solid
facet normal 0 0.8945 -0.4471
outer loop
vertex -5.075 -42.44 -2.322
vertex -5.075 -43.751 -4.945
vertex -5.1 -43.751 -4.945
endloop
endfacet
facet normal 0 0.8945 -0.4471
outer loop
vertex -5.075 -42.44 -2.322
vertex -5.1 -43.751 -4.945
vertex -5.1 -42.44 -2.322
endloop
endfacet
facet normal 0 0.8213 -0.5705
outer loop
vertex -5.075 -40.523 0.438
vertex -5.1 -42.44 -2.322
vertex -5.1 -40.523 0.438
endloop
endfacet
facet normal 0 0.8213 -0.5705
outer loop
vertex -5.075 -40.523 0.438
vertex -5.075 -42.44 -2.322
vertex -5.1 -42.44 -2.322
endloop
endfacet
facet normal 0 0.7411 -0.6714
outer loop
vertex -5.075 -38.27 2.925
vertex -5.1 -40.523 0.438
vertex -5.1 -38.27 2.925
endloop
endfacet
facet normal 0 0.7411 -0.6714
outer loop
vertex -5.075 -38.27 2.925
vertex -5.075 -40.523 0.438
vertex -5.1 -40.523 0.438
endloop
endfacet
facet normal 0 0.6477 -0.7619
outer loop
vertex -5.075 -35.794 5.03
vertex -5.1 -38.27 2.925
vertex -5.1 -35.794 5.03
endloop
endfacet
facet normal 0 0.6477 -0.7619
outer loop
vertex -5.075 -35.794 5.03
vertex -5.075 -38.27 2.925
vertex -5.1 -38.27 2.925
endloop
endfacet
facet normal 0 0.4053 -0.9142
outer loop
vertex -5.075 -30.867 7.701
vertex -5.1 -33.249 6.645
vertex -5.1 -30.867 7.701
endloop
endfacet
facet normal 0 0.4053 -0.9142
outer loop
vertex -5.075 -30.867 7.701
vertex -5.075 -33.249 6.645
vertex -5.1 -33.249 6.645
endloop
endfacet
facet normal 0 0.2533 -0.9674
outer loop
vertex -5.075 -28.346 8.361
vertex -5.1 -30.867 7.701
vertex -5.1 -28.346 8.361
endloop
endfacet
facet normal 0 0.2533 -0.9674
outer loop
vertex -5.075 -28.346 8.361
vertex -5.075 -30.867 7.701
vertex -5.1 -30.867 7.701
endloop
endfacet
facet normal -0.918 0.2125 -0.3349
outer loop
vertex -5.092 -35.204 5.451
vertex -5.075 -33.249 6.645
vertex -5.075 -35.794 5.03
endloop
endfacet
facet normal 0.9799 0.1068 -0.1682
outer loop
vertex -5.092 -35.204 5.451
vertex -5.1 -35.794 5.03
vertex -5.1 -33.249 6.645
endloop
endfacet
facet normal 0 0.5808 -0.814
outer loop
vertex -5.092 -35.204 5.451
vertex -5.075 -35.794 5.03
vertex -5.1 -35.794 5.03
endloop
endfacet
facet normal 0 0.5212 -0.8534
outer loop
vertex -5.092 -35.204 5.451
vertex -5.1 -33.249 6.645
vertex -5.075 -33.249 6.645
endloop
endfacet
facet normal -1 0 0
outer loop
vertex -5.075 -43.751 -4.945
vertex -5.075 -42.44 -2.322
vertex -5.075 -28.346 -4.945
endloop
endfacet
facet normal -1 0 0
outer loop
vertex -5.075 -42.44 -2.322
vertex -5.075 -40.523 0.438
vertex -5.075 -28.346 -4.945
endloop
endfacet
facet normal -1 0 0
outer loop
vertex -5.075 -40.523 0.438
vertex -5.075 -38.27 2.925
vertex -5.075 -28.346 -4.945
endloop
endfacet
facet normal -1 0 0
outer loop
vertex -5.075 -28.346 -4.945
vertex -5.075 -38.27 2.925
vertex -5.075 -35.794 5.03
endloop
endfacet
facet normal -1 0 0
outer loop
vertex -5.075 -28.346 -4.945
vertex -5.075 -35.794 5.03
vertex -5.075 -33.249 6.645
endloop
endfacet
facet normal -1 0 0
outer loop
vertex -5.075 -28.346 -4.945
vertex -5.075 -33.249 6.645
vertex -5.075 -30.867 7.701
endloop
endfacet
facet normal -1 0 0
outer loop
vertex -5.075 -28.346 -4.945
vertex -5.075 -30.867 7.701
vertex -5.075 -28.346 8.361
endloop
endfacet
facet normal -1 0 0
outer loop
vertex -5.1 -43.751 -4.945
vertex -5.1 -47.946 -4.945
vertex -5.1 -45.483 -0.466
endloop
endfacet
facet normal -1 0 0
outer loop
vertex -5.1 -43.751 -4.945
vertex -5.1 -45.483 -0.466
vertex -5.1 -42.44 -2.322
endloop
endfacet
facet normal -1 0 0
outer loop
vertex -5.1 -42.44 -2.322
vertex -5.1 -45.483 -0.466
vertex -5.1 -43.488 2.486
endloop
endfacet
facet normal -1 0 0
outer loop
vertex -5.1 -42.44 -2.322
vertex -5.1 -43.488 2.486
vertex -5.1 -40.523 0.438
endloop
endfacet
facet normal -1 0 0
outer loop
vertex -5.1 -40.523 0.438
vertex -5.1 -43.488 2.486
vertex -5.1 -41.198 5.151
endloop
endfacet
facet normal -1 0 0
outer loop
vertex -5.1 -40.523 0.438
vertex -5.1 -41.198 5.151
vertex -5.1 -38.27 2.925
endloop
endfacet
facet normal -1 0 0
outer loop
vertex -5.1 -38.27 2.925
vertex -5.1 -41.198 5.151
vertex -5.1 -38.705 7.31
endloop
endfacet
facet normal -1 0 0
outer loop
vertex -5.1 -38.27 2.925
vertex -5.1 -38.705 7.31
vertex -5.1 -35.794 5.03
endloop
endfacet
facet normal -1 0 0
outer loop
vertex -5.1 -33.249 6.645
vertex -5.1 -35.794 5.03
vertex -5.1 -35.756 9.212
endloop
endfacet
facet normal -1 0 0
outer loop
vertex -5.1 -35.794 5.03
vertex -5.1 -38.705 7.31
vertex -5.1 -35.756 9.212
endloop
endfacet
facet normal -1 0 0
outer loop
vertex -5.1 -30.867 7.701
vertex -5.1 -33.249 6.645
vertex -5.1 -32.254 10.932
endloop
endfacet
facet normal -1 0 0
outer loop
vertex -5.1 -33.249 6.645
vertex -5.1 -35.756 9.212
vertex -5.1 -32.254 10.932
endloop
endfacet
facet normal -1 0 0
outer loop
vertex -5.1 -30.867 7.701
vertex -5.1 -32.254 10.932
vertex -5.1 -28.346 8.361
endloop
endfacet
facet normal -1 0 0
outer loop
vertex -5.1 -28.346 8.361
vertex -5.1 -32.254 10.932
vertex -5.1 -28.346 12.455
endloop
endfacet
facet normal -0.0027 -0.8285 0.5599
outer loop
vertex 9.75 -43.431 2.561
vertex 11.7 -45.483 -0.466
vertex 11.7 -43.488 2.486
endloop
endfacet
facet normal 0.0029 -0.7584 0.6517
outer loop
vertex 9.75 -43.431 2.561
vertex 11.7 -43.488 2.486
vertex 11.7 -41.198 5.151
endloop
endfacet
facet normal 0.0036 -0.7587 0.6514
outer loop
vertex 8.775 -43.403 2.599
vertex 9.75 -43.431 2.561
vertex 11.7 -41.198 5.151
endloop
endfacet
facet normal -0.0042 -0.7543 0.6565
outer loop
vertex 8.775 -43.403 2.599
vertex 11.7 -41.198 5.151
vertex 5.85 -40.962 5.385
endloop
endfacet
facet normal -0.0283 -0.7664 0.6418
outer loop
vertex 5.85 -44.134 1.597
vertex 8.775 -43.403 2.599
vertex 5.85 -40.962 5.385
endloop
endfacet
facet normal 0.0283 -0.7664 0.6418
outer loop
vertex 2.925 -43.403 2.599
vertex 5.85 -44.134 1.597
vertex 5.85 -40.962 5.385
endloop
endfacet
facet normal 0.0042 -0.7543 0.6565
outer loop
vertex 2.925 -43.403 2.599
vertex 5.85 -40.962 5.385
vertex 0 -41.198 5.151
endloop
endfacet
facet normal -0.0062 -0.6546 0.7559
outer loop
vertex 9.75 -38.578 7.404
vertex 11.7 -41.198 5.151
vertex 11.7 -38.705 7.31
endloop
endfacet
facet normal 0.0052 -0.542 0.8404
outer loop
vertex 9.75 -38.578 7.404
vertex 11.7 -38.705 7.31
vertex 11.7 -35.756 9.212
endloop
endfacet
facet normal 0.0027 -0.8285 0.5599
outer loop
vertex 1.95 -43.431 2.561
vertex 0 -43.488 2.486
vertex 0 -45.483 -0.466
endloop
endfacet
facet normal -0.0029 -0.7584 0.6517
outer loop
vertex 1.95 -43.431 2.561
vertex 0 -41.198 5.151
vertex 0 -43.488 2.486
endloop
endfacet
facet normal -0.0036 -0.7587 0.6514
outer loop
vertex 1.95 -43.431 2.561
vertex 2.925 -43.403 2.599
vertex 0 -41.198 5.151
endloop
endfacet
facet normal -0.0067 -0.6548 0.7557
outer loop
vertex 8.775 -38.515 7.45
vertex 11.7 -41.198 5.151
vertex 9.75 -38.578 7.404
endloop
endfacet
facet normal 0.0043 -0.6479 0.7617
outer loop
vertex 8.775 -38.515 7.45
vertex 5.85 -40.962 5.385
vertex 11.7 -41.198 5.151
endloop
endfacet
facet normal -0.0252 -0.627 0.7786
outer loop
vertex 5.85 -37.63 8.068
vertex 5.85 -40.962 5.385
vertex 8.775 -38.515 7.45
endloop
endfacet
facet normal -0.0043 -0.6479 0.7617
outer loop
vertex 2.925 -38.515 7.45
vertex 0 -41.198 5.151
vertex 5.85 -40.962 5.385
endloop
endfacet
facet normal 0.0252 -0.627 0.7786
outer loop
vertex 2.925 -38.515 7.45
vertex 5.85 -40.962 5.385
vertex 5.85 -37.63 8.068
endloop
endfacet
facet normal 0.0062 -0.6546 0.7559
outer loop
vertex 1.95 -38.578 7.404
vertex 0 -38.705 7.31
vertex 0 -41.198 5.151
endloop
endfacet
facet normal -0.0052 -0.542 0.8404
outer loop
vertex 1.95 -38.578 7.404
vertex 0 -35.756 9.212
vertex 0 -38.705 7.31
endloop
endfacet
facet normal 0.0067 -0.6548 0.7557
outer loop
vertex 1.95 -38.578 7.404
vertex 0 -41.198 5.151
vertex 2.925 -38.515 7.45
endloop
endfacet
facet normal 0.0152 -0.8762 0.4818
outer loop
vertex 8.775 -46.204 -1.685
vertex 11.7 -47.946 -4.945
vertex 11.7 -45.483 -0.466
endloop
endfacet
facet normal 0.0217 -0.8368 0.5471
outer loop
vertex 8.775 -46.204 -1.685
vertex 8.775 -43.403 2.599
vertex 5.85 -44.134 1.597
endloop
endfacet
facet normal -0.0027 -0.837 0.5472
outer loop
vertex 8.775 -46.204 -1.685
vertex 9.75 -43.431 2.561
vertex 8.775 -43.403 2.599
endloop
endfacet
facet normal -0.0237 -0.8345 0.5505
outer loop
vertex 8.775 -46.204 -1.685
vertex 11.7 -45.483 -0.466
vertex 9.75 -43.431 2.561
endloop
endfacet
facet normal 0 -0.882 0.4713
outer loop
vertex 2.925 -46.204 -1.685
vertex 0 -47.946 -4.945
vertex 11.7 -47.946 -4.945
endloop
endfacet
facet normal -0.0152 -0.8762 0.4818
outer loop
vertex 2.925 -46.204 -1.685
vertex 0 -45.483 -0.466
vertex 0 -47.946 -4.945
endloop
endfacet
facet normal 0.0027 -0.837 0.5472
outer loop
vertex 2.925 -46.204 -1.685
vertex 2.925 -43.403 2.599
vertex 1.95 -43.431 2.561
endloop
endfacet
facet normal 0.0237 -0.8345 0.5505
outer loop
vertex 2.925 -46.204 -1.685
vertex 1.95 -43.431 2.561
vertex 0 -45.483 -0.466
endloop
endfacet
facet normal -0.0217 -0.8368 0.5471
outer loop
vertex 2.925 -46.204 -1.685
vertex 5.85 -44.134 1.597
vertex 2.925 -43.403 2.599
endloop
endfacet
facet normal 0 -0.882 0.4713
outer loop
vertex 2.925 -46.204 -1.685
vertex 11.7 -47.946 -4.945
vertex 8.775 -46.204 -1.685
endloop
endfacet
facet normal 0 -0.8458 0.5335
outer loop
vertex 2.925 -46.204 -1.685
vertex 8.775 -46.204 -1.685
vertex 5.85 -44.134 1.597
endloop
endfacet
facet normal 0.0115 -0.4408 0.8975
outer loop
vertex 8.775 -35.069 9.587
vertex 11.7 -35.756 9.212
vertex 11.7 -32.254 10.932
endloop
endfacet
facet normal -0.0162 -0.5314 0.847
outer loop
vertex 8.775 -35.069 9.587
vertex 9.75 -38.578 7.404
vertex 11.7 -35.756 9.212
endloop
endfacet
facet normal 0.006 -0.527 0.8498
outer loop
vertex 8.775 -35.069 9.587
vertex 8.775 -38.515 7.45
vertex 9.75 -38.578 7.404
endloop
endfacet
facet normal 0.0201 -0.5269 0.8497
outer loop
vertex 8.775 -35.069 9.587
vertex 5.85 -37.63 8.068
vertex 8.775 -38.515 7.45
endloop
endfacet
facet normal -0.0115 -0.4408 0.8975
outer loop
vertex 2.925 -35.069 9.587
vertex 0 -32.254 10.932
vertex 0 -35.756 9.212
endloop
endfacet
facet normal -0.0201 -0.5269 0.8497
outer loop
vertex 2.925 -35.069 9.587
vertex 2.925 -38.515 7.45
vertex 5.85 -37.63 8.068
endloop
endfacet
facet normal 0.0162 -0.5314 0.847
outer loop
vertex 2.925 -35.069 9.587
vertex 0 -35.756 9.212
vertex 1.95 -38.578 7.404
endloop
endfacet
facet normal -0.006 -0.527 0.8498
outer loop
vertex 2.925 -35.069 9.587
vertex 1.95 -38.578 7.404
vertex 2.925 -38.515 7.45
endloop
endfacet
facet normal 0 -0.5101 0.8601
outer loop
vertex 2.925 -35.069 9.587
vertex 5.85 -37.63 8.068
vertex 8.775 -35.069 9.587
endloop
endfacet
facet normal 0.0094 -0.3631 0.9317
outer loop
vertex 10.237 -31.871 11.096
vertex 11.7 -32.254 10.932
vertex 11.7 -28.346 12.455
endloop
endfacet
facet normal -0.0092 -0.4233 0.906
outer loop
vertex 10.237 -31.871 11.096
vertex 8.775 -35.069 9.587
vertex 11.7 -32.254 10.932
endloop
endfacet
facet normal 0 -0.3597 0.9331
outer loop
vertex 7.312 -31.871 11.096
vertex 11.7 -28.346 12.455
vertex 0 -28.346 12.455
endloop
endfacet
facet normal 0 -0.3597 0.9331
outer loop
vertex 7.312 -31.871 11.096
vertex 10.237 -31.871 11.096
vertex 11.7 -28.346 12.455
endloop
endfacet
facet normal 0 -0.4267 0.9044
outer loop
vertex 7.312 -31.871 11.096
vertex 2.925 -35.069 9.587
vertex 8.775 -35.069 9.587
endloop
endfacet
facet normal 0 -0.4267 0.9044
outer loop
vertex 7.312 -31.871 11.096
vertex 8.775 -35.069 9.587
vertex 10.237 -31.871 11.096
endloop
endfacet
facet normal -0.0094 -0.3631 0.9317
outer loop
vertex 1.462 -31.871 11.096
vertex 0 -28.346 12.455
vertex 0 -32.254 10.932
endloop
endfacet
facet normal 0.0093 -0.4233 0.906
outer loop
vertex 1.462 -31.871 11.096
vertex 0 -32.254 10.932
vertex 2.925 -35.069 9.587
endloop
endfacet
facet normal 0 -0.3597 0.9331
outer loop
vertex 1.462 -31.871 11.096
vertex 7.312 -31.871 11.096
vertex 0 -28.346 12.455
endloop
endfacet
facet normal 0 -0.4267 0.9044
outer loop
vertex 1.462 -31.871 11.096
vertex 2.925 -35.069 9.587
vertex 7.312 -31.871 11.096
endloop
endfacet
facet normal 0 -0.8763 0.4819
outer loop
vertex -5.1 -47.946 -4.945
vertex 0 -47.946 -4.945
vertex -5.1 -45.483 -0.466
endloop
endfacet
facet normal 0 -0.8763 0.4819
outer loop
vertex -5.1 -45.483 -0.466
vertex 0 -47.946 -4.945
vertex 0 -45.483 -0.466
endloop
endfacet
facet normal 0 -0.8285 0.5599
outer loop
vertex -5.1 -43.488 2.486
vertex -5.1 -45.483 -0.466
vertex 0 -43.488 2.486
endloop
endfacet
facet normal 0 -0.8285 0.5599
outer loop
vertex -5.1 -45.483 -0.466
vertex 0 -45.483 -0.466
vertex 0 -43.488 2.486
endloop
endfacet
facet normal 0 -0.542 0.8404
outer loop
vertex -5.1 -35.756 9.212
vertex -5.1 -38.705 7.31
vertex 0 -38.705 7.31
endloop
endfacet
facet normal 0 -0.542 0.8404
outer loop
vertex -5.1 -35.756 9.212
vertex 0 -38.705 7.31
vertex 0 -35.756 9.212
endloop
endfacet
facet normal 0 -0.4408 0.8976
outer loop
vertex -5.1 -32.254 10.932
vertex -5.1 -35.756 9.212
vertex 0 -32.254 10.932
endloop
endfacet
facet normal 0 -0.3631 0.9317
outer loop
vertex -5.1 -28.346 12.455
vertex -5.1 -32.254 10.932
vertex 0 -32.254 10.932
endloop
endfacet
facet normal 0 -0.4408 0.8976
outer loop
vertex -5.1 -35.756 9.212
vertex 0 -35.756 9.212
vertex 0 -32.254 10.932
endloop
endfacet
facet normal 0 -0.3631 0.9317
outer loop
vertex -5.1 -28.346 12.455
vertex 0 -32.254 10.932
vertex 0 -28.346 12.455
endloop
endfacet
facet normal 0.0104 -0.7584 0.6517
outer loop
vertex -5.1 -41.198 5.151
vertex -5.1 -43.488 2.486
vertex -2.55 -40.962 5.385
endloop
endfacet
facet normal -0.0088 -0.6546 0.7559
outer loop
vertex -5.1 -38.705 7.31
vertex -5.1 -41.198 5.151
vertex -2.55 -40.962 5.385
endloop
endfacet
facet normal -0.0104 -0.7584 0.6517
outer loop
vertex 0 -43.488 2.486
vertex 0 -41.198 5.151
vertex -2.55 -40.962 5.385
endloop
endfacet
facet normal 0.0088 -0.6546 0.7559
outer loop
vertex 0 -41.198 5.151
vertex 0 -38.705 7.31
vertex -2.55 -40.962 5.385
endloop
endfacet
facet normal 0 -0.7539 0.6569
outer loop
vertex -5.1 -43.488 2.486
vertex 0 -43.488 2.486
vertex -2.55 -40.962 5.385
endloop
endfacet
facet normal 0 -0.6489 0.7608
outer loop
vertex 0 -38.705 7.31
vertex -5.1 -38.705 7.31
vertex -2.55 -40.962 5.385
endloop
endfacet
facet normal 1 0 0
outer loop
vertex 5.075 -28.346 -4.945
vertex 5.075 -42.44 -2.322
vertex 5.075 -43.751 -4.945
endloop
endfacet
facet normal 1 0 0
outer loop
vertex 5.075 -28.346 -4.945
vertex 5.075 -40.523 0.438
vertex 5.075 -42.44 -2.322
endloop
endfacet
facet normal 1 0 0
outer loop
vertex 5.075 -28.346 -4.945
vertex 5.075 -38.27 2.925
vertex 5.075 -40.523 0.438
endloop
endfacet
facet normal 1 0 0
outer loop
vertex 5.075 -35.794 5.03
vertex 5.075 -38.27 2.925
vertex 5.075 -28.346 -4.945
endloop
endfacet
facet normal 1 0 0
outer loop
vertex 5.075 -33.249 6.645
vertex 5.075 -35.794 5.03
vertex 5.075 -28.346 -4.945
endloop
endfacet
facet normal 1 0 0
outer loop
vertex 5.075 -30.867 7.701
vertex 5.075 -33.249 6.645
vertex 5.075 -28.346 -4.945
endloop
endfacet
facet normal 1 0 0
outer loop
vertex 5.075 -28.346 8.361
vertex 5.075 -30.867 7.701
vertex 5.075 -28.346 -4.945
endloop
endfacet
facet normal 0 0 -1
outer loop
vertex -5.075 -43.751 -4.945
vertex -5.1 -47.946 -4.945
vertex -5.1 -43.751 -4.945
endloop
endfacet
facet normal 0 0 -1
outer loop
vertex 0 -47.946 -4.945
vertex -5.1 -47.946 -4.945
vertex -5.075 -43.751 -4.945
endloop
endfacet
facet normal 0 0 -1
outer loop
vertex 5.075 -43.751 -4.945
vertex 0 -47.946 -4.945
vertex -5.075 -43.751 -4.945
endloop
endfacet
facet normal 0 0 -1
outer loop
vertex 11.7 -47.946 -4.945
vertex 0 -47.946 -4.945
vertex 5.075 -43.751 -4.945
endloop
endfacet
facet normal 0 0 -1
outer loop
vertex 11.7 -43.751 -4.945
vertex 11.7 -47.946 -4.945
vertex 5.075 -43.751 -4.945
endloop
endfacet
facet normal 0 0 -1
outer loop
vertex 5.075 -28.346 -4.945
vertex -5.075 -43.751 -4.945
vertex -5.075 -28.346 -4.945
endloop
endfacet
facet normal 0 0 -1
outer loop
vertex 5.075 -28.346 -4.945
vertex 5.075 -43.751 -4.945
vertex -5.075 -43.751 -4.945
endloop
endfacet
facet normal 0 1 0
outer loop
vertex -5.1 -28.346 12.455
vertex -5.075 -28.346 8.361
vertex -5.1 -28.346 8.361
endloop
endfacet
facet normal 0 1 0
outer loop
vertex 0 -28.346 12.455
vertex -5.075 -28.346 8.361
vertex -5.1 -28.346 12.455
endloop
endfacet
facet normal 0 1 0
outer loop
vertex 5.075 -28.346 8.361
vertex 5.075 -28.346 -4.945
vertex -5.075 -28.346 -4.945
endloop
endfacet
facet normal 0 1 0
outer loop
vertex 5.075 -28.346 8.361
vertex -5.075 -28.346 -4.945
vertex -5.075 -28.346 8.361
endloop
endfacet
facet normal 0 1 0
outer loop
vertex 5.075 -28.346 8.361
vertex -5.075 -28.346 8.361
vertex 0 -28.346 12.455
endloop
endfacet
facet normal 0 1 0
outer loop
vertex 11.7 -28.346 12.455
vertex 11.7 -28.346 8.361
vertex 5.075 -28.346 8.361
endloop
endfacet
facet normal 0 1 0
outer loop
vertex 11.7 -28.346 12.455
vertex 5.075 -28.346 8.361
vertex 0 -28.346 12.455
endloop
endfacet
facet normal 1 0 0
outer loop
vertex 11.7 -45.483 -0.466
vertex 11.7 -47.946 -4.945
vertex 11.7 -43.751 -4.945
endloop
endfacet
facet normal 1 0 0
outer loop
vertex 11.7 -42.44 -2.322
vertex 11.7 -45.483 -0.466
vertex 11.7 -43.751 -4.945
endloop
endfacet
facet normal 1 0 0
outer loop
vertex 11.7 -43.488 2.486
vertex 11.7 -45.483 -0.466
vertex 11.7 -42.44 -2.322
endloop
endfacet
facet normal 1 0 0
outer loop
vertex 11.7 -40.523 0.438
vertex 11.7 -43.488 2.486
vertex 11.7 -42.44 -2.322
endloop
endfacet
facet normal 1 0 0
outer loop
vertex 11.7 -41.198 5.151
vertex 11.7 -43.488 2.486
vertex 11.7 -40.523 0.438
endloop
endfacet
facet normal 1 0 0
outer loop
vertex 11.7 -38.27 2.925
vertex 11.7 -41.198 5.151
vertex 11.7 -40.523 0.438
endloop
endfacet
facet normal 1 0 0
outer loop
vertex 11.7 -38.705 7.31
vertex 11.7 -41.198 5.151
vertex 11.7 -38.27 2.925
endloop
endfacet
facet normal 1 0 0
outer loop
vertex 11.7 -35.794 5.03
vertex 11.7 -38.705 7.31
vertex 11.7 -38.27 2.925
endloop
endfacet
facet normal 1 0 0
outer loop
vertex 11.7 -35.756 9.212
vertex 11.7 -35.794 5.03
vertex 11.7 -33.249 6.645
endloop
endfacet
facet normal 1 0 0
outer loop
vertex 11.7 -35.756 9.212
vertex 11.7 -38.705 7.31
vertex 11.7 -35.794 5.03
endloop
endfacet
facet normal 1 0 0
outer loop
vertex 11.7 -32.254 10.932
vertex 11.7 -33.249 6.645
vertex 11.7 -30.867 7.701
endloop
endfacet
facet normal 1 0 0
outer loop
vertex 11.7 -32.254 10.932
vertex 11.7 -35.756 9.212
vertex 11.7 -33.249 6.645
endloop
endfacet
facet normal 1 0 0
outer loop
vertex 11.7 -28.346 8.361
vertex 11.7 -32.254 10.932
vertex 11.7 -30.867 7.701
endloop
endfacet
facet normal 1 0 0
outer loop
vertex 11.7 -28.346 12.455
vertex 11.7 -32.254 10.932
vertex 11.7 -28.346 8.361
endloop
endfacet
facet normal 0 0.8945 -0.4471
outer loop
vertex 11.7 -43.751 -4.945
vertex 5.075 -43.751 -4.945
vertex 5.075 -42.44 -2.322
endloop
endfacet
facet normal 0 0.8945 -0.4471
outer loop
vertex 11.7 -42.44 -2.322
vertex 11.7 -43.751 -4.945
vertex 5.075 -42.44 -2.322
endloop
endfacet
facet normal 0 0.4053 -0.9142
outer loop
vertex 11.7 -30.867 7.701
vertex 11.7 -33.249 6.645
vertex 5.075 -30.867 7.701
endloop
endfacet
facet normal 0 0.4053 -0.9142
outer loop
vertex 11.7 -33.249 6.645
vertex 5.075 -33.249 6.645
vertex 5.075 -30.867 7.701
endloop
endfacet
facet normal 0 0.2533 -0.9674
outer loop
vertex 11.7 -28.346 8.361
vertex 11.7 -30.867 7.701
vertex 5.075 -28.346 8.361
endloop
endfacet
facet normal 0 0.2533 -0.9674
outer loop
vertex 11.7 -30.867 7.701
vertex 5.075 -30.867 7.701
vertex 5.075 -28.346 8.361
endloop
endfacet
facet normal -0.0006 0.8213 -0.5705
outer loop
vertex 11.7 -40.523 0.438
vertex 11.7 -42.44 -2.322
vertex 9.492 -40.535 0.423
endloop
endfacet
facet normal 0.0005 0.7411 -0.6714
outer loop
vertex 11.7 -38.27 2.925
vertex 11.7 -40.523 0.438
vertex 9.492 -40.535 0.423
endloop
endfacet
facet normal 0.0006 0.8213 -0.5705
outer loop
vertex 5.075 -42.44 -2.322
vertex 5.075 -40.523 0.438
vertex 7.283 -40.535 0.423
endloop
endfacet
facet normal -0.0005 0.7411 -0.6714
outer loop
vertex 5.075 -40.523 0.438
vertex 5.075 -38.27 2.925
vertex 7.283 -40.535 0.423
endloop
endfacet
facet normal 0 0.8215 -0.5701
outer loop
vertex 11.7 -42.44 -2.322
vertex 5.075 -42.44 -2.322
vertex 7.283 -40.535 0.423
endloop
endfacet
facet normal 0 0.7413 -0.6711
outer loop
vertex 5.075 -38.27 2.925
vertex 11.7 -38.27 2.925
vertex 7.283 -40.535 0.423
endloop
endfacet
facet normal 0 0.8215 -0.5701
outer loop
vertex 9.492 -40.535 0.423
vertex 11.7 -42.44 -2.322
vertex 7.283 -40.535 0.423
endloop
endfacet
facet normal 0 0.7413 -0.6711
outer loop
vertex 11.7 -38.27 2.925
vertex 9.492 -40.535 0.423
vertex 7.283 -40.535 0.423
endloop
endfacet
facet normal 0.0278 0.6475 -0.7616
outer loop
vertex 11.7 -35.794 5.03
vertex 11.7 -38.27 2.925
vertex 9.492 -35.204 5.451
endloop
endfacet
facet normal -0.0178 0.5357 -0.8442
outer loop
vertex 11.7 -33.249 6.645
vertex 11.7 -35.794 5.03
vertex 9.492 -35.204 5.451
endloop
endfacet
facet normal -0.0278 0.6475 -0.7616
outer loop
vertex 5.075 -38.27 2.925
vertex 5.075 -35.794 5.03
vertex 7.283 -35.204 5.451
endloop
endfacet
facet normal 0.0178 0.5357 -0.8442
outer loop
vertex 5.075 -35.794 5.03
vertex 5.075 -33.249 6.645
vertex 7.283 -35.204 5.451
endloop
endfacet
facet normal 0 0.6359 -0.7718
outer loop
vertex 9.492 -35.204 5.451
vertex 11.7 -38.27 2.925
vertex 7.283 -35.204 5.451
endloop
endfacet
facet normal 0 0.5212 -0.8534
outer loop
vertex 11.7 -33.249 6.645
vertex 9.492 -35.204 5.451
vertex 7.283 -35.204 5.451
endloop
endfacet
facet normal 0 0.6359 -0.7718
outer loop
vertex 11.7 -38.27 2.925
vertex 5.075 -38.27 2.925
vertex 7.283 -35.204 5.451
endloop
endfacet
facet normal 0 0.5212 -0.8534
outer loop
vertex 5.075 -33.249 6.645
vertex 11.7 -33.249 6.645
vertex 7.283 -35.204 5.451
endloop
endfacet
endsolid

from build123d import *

# Parameters (mm, degrees)
F3_DEPTH      = 5.075
F4_DEPTH      = 11.7
F4_DEPTH_BACK = 5.1


# Not quite as in the source:
# - the program builds the solid bodies; features that only make, move or delete a surface that nothing else refers to are left out


with BuildPart() as f3:
    # F2 (on Right) → F3 (new body, symmetric)
    with BuildSketch(Plane.YZ):
        with BuildLine():
            Line((-28.3462911332, -4.9449687588), (-28.3462911332, 8.3612054586))
            add(Edge.make_bspline(
                [(-43.7509737622, -4.9449687588), (-41.7884092148, 0), (-35.7711096695, 7.1036480367), (-28.3462911332, 8.3612054586)],
                knots=[0, 0, 0, 0, 20.3557981716, 20.3557981716, 20.3557981716, 20.3557981716], degree=3))
            Line((-43.7509737622, -4.9449687588), (-28.3462911332, -4.9449687588))
        make_face()
    extrude(amount=F3_DEPTH, both=True)

    # F2 (on Right) → F4 (join, two sides)
    with BuildSketch(Plane.YZ) as f4_sk:
        with BuildLine():
            Line((-28.3462911332, 8.3612054586), (-28.3462911332, 12.4550312412))
            add(Edge.make_bspline(
                [(-47.9462911332, -4.9449687588), (-46.2080227994, -1.5012717921), (-41.5989810613, 6.6616658975), (-33.5069069781, 10.6230272322), (-28.3462911332, 12.4550312412)],
                knots=[0, 0, 0, 0, 0.4814819879, 1, 1, 1, 1], degree=3))
            Line((-47.9462911332, -4.9449687588), (-43.7509737622, -4.9449687588))
            add(Edge.make_bspline(
                [(-43.7509737622, -4.9449687588), (-41.7884092148, 0), (-35.7711096695, 7.1036480367), (-28.3462911332, 8.3612054586)],
                knots=[0, 0, 0, 0, 20.3557981716, 20.3557981716, 20.3557981716, 20.3557981716], degree=3))
        make_face()
    extrude(amount=F4_DEPTH)
    extrude(f4_sk.sketch, amount=-F4_DEPTH_BACK)


solid = f3.part
